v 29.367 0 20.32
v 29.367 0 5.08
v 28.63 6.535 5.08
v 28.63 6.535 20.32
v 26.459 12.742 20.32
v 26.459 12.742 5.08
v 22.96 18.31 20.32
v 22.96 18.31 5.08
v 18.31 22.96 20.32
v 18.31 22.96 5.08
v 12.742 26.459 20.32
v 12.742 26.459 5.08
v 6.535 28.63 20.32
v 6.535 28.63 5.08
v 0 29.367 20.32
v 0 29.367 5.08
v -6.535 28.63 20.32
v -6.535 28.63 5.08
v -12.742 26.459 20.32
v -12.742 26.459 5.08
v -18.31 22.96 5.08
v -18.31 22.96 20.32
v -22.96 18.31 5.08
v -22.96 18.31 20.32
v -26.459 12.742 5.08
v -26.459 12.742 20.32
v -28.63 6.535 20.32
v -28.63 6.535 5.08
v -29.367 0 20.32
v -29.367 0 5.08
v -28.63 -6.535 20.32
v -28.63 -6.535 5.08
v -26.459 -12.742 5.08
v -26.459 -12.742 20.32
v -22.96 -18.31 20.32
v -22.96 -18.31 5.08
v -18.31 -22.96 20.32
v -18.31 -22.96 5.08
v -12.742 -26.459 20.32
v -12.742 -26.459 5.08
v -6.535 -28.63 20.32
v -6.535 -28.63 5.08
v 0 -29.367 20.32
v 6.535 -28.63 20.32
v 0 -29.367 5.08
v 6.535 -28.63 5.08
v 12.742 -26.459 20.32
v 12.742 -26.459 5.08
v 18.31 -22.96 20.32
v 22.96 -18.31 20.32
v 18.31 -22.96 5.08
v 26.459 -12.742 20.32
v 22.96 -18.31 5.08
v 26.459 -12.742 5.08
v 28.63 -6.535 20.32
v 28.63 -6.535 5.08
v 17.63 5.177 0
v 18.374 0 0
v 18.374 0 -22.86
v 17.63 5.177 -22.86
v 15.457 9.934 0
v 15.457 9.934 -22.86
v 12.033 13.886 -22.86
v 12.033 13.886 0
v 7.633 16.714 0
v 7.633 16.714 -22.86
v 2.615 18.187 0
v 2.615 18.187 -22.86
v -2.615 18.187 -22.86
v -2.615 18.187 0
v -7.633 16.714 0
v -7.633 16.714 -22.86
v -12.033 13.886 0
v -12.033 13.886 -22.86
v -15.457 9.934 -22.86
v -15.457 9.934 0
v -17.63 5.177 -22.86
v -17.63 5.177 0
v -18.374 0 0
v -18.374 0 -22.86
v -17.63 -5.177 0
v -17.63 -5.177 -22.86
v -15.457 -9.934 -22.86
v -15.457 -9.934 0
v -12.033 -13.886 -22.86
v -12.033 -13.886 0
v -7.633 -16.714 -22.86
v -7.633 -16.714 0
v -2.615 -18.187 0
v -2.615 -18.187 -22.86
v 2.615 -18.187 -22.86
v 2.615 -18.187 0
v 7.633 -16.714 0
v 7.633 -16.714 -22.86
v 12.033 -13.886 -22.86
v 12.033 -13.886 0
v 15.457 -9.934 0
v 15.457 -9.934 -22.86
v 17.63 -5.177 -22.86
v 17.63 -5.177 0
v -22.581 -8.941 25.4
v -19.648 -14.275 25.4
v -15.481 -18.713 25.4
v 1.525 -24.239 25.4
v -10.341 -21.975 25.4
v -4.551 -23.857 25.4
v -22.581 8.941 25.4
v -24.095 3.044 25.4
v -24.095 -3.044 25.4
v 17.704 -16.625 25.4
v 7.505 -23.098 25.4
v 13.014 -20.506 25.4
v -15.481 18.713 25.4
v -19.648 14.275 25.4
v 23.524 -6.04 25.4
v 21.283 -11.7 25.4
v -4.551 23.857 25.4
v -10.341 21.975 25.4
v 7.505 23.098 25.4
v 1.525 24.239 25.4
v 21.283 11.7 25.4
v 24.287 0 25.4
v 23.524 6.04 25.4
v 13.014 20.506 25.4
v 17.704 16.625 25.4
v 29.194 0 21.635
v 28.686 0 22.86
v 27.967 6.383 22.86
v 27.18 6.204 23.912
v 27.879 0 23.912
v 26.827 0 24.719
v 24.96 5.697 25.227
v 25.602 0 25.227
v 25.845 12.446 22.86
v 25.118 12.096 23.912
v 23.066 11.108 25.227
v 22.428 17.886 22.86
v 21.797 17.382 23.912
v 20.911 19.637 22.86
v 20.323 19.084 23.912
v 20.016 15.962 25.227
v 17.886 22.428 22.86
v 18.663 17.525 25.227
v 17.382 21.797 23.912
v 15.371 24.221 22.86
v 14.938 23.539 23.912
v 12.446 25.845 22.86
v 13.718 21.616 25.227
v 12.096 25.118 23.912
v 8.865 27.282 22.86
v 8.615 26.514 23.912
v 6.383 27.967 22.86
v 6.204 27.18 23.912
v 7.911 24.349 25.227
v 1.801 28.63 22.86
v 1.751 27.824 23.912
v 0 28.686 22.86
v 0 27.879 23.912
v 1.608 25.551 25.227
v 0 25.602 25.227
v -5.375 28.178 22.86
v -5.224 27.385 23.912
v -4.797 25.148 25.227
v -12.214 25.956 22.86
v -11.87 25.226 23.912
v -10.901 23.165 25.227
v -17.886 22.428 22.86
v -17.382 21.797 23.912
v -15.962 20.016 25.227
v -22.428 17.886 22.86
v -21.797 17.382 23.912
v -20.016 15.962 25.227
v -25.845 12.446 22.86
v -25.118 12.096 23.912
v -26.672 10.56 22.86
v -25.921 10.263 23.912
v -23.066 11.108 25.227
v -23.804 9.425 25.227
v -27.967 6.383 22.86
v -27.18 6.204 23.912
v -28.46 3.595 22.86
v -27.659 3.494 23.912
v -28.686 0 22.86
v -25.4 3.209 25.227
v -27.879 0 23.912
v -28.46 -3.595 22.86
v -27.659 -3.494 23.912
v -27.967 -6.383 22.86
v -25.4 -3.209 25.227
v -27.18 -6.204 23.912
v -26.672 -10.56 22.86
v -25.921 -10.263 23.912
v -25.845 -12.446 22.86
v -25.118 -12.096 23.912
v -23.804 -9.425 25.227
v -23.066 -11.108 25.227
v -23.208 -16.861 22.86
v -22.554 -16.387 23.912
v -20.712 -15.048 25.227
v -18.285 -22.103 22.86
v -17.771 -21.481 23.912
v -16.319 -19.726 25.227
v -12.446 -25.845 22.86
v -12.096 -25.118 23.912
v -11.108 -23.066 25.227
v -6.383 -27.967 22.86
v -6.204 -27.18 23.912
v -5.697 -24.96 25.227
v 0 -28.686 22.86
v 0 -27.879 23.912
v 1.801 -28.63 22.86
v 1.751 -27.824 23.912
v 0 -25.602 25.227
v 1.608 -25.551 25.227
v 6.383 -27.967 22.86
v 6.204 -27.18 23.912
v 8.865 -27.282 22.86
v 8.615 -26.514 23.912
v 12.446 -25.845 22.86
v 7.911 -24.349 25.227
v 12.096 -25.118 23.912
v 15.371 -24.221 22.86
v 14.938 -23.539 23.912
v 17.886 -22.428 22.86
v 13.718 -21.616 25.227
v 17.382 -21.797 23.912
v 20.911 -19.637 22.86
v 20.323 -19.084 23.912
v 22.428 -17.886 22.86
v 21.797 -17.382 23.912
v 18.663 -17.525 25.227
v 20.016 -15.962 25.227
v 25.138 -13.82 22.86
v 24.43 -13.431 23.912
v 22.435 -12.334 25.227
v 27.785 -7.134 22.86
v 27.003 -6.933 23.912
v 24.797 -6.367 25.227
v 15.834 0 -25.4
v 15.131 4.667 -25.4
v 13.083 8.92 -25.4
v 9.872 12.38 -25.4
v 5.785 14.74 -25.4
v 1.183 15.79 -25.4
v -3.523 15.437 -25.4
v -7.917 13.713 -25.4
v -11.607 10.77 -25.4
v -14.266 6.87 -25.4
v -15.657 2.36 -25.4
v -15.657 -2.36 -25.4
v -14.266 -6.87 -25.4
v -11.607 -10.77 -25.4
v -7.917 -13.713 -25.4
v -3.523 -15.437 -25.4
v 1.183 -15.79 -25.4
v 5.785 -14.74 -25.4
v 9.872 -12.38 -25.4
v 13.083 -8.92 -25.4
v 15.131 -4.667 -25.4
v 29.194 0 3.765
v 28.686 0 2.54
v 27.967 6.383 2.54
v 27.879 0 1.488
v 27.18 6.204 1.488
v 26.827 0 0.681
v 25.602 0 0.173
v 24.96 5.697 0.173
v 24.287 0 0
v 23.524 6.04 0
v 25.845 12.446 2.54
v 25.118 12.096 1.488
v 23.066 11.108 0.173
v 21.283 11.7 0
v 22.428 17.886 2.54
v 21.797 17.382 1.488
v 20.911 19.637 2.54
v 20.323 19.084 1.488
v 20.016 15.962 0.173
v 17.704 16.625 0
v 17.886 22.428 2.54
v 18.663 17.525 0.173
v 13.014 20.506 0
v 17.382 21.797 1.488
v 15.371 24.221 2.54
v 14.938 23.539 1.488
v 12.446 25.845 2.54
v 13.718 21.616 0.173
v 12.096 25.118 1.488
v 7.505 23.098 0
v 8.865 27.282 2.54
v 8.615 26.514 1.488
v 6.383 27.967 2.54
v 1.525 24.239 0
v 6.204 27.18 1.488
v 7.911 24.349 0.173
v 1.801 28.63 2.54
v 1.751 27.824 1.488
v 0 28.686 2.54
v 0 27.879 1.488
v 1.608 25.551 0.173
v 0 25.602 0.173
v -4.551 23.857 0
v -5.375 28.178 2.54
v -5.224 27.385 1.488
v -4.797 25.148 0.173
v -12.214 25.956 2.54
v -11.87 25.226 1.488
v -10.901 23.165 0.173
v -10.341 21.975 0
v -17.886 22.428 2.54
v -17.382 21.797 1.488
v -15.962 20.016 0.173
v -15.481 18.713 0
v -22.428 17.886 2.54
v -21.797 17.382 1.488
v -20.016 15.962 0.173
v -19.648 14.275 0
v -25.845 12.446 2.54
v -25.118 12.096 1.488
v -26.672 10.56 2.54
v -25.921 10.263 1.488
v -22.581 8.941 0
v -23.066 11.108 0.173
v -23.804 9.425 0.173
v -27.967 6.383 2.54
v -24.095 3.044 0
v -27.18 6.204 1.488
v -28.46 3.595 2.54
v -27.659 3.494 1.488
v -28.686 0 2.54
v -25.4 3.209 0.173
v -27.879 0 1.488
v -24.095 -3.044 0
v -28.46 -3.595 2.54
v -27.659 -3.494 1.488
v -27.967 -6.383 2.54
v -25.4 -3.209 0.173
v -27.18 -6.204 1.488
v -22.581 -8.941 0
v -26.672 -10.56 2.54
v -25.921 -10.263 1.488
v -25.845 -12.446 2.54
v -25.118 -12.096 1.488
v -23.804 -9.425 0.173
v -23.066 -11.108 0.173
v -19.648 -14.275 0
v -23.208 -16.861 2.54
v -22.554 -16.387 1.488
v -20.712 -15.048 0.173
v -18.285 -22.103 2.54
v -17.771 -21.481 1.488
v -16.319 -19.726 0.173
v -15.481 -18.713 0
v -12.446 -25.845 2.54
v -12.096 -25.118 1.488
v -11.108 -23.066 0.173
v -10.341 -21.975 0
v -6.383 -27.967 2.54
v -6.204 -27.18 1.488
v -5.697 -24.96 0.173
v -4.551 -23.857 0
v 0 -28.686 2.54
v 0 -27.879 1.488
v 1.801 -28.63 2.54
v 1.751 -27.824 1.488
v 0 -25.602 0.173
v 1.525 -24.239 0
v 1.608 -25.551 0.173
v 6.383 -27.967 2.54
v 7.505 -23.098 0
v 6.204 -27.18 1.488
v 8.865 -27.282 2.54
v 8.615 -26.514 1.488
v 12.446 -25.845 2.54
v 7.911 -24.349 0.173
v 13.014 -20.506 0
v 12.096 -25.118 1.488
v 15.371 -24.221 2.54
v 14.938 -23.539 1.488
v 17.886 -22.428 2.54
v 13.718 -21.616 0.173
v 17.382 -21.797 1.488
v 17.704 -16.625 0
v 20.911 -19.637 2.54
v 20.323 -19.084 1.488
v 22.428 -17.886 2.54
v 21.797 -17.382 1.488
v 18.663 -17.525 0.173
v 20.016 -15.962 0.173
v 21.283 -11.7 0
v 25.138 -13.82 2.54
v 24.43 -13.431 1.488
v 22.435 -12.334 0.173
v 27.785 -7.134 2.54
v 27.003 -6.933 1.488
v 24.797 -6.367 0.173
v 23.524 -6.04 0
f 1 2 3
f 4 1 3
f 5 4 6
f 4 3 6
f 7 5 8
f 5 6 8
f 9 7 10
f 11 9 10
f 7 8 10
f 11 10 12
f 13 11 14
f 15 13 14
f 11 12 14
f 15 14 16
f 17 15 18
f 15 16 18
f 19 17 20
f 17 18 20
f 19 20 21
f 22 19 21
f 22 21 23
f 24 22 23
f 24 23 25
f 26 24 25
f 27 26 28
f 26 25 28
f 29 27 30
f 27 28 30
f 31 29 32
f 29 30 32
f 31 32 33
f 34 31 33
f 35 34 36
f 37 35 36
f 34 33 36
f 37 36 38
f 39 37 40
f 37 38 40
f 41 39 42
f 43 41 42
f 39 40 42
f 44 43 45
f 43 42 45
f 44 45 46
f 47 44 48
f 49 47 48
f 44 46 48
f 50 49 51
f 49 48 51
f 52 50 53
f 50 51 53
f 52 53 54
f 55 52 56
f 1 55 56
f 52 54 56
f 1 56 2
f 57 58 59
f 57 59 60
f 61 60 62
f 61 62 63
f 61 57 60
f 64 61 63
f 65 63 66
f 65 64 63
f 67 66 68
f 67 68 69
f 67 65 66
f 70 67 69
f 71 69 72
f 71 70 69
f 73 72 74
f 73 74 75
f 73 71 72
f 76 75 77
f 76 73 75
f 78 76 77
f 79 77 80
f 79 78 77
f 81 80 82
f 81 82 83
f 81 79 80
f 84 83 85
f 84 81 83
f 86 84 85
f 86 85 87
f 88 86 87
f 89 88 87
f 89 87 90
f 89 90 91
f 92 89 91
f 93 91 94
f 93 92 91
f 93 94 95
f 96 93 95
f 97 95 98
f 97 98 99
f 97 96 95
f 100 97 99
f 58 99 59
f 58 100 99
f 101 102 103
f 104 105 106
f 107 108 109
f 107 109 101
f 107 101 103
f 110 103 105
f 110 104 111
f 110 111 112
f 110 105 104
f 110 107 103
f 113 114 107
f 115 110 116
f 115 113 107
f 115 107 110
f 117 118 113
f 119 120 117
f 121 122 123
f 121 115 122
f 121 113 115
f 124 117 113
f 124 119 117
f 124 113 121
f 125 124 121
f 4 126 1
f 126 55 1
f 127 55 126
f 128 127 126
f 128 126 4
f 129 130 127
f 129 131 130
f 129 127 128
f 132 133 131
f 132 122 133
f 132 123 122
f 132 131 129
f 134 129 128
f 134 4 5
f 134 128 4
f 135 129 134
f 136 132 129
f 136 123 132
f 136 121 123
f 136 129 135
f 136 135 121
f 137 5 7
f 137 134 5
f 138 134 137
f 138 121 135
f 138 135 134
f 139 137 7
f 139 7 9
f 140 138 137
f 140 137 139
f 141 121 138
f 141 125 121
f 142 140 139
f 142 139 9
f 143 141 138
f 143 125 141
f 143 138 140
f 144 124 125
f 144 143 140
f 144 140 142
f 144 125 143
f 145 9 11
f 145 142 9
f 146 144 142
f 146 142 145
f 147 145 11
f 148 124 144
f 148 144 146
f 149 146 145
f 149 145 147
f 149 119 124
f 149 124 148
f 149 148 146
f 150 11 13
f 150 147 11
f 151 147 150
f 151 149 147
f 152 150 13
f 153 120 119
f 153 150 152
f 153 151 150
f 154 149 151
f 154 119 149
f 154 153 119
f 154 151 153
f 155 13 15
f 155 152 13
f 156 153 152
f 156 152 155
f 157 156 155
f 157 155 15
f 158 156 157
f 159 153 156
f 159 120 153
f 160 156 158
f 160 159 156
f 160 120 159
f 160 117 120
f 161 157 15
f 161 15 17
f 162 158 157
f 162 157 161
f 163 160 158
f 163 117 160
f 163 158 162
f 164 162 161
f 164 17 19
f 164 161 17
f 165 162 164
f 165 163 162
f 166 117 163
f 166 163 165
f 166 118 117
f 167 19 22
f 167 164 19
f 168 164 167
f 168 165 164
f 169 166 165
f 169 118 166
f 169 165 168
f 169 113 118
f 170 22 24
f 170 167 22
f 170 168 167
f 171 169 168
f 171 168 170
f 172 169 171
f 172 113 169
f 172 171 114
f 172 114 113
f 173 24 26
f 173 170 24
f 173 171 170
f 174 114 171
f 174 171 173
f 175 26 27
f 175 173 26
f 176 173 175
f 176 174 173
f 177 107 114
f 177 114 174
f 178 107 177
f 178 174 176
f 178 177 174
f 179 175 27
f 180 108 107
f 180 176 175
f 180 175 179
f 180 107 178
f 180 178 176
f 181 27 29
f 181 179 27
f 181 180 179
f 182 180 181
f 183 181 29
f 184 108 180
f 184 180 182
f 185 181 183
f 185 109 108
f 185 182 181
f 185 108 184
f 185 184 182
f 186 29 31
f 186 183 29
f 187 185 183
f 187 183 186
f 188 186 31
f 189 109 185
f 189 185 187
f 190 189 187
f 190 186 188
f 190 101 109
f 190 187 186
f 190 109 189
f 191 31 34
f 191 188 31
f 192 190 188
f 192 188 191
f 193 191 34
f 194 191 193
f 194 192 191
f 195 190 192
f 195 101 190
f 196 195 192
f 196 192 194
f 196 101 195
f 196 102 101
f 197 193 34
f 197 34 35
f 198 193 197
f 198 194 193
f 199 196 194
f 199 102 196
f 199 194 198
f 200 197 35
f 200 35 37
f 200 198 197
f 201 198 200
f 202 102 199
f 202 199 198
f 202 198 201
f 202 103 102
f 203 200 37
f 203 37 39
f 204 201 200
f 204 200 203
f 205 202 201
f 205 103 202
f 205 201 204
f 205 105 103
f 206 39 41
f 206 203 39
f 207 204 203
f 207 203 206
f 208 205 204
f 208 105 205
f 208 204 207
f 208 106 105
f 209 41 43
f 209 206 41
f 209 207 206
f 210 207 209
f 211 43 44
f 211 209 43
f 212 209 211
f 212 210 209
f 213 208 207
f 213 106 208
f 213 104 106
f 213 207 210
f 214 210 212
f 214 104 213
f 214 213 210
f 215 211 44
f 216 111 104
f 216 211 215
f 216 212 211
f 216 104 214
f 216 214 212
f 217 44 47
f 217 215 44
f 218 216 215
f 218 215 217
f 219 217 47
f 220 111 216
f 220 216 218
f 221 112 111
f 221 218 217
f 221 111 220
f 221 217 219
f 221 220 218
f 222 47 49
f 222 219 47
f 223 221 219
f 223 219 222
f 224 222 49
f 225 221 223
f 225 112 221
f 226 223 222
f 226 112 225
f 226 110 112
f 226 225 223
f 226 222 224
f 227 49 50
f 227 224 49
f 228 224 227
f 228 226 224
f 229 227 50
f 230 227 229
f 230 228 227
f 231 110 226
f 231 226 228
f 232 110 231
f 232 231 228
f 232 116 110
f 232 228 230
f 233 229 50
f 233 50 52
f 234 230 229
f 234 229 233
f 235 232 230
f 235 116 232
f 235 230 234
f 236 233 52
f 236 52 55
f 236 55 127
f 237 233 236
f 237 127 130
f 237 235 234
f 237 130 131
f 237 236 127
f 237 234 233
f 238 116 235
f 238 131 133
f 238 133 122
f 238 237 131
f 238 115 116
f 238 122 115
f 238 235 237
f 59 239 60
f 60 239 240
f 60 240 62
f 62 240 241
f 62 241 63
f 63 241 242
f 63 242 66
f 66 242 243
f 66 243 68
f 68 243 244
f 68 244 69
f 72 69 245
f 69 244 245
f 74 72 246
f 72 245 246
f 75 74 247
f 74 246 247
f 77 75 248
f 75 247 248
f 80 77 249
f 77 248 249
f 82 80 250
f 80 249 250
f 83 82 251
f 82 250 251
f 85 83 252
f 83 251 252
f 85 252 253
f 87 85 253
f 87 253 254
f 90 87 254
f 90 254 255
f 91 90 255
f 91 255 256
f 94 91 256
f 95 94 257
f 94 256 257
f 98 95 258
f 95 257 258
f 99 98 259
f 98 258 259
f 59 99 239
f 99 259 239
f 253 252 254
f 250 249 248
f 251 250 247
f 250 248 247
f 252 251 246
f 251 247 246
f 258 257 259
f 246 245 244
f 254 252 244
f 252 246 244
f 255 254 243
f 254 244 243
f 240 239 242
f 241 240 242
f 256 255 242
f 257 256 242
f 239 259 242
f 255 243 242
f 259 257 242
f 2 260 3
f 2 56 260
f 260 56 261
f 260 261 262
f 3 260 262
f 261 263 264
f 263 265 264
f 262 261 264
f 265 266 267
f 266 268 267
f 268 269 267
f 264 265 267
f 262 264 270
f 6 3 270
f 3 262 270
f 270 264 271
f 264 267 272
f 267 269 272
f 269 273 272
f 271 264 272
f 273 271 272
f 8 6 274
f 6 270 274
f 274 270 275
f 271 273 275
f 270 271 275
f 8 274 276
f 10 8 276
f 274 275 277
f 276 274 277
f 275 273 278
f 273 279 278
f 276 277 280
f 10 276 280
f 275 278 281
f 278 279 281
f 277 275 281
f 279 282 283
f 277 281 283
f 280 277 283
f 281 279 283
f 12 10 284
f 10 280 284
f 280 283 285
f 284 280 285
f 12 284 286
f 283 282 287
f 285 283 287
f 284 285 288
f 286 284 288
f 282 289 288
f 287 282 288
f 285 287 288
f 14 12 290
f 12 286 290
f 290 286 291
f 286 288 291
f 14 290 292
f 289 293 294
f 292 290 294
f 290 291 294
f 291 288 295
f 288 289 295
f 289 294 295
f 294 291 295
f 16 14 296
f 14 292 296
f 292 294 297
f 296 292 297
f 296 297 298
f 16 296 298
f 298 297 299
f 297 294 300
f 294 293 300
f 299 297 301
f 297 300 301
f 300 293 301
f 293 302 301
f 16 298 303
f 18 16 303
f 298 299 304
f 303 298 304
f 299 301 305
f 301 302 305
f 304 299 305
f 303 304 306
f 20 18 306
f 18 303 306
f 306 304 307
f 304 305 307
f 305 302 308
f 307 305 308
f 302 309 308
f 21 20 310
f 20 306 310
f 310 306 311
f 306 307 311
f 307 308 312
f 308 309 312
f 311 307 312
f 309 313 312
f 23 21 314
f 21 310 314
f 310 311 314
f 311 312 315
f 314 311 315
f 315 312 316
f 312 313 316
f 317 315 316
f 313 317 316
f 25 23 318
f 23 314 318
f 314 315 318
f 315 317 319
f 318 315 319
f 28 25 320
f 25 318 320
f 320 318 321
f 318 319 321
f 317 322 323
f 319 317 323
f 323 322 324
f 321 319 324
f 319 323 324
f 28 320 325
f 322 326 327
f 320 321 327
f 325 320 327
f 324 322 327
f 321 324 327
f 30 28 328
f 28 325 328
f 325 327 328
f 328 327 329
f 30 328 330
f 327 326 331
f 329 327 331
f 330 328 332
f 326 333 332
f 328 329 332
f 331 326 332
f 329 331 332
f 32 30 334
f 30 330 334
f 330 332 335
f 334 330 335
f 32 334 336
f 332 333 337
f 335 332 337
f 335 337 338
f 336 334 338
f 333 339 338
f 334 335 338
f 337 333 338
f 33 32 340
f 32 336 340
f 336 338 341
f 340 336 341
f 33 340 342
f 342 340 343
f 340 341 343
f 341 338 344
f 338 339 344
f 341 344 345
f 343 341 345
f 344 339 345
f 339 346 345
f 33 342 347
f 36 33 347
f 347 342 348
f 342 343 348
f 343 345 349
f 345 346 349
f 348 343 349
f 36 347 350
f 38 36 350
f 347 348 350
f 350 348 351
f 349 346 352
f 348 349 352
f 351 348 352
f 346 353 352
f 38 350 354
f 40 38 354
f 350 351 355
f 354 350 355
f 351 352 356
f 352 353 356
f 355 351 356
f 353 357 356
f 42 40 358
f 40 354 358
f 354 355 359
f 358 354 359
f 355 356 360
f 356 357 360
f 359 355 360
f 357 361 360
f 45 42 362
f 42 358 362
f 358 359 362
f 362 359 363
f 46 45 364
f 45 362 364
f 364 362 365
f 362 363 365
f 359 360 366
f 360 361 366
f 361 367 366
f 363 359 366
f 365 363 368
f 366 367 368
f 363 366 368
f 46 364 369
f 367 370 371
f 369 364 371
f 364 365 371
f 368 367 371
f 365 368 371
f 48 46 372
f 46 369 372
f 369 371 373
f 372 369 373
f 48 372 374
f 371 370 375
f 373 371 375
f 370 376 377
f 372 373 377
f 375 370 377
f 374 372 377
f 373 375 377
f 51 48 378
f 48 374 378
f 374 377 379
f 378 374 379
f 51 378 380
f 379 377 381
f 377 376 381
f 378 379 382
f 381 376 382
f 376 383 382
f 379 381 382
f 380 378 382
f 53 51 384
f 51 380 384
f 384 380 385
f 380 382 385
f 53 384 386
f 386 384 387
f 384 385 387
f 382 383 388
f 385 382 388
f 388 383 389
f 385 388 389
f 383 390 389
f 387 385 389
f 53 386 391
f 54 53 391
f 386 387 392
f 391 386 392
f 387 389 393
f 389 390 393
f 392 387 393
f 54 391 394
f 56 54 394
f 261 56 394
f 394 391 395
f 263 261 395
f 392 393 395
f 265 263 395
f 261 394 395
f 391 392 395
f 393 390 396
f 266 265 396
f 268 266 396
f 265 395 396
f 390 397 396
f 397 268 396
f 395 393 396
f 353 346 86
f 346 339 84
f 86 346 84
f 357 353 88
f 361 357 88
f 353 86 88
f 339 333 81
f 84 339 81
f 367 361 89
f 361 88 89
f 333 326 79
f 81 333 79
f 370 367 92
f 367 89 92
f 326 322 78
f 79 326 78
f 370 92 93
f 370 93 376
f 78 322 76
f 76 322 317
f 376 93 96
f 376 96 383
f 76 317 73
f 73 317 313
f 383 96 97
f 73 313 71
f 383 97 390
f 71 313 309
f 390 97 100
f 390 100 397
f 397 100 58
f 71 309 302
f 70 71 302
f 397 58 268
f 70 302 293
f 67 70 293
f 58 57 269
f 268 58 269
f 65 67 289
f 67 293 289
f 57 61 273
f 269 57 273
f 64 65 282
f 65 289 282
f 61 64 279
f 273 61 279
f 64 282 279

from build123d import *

# Parameters (mm, degrees)
F0_R     = 18.374195
F1_DEPTH = 25.4
F2_R     = 29.366769
F3_DEPTH = 25.4
F4_R     = 5.08
F5_R     = 5.08
F6_SIZE  = 2.54


with BuildPart() as f1:
    # F0 (on Top) → F1 (new body)
    with BuildSketch(Plane.XY):
        Circle(F0_R)
    extrude(amount=-F1_DEPTH)

    # F2 (on Top) → F3 (join)
    with BuildSketch(Plane.XY):
        Circle(F2_R)
    extrude(amount=F3_DEPTH)

    # F4
    f4_edges = [f1.edges().sort_by_distance(p)[0] for p in [
        (-29.366769, 0, 25.4),
    ]]
    fillet(f4_edges, radius=F4_R)

    # F5
    f5_edges = [f1.edges().sort_by_distance(p)[0] for p in [
        (-29.366769, 0, 0),
    ]]
    fillet(f5_edges, radius=F5_R)

    # F6
    f6_edges = [f1.edges().sort_by_distance(p)[0] for p in [
        (-18.374195, 0, -25.4),
    ]]
    chamfer(f6_edges, length=F6_SIZE)


solid = f1.part
